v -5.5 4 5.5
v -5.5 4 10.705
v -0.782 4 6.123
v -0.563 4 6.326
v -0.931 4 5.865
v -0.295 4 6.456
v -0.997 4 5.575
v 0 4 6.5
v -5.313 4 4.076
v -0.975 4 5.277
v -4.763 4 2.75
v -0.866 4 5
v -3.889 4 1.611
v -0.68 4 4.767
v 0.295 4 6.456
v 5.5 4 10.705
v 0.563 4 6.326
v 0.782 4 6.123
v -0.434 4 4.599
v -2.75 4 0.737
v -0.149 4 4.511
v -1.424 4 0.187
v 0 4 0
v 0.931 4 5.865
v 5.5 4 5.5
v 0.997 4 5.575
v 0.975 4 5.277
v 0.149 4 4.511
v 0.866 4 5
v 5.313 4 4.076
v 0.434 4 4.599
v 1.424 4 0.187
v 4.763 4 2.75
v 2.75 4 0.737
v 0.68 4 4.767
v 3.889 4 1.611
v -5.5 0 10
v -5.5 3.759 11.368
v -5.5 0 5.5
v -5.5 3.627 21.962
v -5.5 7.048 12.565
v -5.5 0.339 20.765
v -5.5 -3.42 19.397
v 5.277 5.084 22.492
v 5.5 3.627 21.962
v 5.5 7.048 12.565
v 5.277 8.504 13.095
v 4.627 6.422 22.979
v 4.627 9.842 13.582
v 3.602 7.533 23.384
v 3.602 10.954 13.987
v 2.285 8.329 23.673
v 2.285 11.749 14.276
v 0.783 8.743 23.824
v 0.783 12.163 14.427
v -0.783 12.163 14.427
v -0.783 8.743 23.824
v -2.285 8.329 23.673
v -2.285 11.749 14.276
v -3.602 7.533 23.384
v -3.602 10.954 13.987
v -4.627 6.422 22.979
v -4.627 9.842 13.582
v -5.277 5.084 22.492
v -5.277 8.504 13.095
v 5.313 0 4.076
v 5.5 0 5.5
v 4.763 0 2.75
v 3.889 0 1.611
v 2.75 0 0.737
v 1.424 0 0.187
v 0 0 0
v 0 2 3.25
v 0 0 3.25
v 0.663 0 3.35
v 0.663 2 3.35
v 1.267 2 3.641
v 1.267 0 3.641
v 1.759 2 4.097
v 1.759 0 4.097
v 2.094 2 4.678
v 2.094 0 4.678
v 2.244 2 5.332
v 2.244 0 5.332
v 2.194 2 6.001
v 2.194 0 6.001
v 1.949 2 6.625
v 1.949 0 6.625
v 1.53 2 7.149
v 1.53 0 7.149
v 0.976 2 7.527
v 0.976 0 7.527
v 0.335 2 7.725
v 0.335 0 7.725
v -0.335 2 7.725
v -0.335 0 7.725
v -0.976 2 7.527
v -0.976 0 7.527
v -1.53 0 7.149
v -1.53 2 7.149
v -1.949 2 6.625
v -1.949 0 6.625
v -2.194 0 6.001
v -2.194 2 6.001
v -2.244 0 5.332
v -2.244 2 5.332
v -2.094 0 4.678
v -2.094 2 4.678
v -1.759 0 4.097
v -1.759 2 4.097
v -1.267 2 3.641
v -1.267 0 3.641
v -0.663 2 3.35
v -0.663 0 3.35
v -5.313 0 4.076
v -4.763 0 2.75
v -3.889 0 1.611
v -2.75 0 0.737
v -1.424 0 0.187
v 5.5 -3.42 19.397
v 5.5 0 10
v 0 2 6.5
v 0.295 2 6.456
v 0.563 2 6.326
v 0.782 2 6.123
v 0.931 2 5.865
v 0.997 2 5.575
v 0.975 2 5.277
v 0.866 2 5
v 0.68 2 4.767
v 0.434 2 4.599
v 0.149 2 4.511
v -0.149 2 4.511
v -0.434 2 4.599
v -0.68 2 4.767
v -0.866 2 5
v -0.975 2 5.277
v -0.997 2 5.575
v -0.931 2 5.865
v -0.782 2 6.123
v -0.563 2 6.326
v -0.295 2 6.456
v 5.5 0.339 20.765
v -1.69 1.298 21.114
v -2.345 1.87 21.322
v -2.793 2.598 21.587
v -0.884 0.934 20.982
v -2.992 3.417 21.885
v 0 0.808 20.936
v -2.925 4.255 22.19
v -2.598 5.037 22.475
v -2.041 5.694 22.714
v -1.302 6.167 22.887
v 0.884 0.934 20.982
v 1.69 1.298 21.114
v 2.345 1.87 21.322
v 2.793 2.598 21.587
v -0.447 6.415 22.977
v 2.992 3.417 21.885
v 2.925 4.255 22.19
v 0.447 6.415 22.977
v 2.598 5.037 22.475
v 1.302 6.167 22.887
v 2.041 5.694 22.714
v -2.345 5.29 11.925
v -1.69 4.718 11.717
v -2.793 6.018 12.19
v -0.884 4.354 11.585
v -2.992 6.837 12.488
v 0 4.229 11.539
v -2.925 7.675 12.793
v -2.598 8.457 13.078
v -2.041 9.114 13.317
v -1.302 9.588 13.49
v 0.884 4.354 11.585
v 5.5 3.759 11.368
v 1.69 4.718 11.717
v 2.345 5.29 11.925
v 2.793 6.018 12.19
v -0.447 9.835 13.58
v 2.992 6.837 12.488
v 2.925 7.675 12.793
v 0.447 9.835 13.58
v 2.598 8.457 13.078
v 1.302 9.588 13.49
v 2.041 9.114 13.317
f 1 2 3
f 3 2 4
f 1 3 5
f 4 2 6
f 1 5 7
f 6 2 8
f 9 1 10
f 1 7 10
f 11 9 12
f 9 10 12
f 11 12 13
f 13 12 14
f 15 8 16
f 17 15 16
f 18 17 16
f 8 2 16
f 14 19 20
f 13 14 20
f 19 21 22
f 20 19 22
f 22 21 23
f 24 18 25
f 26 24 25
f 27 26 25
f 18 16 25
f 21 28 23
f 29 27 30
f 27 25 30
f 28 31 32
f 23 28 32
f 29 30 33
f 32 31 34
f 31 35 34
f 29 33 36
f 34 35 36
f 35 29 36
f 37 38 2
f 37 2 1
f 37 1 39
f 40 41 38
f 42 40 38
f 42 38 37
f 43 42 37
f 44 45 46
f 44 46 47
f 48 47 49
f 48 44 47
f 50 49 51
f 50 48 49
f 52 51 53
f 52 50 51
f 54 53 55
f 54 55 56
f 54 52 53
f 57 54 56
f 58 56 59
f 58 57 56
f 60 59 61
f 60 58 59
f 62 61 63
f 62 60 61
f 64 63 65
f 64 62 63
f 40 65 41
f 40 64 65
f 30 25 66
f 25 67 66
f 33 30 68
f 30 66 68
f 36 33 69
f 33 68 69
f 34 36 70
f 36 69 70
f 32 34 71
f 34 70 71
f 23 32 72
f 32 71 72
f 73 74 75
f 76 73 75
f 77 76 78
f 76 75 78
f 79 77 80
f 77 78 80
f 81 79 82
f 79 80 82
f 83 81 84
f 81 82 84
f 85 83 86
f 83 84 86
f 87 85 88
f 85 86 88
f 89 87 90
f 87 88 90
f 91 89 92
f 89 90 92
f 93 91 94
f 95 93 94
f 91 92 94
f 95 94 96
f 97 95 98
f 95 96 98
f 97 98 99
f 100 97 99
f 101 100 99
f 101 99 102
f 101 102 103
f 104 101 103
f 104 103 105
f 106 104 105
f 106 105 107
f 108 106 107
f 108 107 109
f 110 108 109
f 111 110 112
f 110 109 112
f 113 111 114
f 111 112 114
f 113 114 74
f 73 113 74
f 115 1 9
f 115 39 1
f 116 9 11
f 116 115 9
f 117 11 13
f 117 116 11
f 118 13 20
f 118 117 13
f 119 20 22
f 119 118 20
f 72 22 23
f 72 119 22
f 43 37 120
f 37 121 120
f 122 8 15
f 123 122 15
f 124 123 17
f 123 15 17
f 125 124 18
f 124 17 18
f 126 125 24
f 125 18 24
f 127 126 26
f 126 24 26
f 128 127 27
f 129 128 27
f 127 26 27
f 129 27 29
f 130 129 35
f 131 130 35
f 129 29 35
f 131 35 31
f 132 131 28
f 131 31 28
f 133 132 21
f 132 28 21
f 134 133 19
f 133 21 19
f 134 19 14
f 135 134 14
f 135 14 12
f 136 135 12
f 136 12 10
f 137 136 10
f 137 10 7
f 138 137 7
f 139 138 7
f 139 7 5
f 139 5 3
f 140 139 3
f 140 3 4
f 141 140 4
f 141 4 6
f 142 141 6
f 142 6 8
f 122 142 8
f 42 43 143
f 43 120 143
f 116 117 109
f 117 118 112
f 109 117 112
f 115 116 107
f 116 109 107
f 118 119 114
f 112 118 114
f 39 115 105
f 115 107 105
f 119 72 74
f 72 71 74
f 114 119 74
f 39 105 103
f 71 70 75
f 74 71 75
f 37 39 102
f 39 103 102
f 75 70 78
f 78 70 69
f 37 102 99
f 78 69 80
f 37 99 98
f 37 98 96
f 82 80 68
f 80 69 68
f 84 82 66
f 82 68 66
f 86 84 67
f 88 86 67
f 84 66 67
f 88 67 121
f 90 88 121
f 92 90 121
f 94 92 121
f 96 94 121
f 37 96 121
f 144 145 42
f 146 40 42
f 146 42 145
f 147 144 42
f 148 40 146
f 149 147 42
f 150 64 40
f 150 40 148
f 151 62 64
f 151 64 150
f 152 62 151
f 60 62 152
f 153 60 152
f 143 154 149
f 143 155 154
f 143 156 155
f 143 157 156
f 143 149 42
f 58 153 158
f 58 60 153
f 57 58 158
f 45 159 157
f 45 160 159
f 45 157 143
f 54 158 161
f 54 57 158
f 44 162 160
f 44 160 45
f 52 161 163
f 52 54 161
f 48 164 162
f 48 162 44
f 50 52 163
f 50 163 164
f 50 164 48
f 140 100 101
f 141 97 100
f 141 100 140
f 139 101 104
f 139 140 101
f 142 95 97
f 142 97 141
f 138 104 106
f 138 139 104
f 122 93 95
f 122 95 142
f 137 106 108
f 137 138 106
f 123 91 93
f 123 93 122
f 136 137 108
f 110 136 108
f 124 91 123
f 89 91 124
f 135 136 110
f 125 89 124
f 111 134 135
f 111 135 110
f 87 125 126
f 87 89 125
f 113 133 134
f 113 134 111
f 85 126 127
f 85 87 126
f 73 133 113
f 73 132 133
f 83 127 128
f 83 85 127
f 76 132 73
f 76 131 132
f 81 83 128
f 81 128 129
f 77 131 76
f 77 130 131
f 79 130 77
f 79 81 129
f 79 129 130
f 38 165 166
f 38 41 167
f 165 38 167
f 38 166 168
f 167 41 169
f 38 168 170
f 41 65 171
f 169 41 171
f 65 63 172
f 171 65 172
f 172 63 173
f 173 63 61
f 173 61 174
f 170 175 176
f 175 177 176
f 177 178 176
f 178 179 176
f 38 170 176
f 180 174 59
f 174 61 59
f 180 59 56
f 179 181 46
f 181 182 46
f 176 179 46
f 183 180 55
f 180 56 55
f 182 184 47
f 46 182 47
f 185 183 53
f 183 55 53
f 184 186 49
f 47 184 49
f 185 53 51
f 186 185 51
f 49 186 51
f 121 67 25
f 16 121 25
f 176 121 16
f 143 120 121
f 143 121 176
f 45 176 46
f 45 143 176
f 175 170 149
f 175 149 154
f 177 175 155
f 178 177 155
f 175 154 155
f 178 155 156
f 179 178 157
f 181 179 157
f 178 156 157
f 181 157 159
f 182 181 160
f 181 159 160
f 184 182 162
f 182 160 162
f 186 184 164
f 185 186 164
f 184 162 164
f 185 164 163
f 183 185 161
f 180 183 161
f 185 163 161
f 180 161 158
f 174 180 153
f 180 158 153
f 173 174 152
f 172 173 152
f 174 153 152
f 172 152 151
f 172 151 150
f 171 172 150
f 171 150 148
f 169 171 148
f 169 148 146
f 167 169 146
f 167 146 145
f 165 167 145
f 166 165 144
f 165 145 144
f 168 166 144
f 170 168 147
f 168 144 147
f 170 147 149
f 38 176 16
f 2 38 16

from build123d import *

# Parameters (mm, degrees)
EXTRUDE_THIN1_DEPTH = 5.5
FILLET1_R           = 5.5
SKETCH3_R           = 1
CUT_EXTRUDE1_DEPTH  = 23.726524062
SKETCH4_R           = 2.25
CUT_EXTRUDE2_DEPTH  = 2
SKETCH5_R           = 3
BOSS_EXTRUDE1_DEPTH = 10


with BuildPart() as part:
    # Sketch2 → Extrude-Thin1 (new, symmetric)
    with BuildSketch(Plane(origin=(0, 0, 0), x_dir=(0, 0, -1), z_dir=(1, 0, 0))):
        Polygon((0, 0), (-10, 0), (-19.396926208, -3.420201433), (-20.765006781, 0.33856905), (-10.705307923, 4), (0, 4), align=None)
    extrude(amount=EXTRUDE_THIN1_DEPTH, both=True)

    # Fillet1
    fillet1_edges = [part.edges().sort_by_distance(p)[0] for p in [
        (-5.5, 2, 0),
        (5.5, 2, 0),
    ]]
    fillet(fillet1_edges, radius=FILLET1_R - 0.0001)  # a hair under: the kernel refuses the full size

    # Sketch3 → Cut-Extrude1 (cut, through all)
    with BuildSketch(Plane(origin=(0, 4, 0), x_dir=(1, 0, 0), z_dir=(0, 1, 0))):
        with Locations(Location((0, -5.5, 0), (0, 0, 270))):
            Circle(SKETCH3_R)
    extrude(amount=-CUT_EXTRUDE1_DEPTH, mode=Mode.SUBTRACT)

    # Sketch4 → Cut-Extrude2 (cut)
    with BuildSketch(Plane.XZ):
        with Locations(Location((0, 5.5, 0), (0, 0, 270))):
            Circle(SKETCH4_R)
    extrude(amount=-CUT_EXTRUDE2_DEPTH, mode=Mode.SUBTRACT)

    # Sketch5 → Boss-Extrude1 (add)
    with BuildSketch(Plane(origin=(0, -6.634139482, 18.227148423), x_dir=(1, 0, 0), z_dir=(0, -0.34202014332567143, 0.9396926207859075))):
        with BuildLine():
            Line((5.5, 7.420201433), (5.5, 10.920201433))
            ThreePointArc((5.5, 10.920201433), (0, 16.420201433), (-5.5, 10.920201433))
            Line((-5.5, 10.920201433), (-5.5, 7.420201433))
            Line((-5.5, 7.420201433), (-5.5, 3.420201433))
            Line((-5.5, 3.420201433), (5.5, 3.420201433))
            Line((5.5, 3.420201433), (5.5, 7.420201433))
        make_face()
        with Locations(Location((0, 10.920201433, 0), (0, 0, 270))):
            Circle(SKETCH5_R, mode=Mode.SUBTRACT)
    extrude(amount=-BOSS_EXTRUDE1_DEPTH)


solid = part.part
